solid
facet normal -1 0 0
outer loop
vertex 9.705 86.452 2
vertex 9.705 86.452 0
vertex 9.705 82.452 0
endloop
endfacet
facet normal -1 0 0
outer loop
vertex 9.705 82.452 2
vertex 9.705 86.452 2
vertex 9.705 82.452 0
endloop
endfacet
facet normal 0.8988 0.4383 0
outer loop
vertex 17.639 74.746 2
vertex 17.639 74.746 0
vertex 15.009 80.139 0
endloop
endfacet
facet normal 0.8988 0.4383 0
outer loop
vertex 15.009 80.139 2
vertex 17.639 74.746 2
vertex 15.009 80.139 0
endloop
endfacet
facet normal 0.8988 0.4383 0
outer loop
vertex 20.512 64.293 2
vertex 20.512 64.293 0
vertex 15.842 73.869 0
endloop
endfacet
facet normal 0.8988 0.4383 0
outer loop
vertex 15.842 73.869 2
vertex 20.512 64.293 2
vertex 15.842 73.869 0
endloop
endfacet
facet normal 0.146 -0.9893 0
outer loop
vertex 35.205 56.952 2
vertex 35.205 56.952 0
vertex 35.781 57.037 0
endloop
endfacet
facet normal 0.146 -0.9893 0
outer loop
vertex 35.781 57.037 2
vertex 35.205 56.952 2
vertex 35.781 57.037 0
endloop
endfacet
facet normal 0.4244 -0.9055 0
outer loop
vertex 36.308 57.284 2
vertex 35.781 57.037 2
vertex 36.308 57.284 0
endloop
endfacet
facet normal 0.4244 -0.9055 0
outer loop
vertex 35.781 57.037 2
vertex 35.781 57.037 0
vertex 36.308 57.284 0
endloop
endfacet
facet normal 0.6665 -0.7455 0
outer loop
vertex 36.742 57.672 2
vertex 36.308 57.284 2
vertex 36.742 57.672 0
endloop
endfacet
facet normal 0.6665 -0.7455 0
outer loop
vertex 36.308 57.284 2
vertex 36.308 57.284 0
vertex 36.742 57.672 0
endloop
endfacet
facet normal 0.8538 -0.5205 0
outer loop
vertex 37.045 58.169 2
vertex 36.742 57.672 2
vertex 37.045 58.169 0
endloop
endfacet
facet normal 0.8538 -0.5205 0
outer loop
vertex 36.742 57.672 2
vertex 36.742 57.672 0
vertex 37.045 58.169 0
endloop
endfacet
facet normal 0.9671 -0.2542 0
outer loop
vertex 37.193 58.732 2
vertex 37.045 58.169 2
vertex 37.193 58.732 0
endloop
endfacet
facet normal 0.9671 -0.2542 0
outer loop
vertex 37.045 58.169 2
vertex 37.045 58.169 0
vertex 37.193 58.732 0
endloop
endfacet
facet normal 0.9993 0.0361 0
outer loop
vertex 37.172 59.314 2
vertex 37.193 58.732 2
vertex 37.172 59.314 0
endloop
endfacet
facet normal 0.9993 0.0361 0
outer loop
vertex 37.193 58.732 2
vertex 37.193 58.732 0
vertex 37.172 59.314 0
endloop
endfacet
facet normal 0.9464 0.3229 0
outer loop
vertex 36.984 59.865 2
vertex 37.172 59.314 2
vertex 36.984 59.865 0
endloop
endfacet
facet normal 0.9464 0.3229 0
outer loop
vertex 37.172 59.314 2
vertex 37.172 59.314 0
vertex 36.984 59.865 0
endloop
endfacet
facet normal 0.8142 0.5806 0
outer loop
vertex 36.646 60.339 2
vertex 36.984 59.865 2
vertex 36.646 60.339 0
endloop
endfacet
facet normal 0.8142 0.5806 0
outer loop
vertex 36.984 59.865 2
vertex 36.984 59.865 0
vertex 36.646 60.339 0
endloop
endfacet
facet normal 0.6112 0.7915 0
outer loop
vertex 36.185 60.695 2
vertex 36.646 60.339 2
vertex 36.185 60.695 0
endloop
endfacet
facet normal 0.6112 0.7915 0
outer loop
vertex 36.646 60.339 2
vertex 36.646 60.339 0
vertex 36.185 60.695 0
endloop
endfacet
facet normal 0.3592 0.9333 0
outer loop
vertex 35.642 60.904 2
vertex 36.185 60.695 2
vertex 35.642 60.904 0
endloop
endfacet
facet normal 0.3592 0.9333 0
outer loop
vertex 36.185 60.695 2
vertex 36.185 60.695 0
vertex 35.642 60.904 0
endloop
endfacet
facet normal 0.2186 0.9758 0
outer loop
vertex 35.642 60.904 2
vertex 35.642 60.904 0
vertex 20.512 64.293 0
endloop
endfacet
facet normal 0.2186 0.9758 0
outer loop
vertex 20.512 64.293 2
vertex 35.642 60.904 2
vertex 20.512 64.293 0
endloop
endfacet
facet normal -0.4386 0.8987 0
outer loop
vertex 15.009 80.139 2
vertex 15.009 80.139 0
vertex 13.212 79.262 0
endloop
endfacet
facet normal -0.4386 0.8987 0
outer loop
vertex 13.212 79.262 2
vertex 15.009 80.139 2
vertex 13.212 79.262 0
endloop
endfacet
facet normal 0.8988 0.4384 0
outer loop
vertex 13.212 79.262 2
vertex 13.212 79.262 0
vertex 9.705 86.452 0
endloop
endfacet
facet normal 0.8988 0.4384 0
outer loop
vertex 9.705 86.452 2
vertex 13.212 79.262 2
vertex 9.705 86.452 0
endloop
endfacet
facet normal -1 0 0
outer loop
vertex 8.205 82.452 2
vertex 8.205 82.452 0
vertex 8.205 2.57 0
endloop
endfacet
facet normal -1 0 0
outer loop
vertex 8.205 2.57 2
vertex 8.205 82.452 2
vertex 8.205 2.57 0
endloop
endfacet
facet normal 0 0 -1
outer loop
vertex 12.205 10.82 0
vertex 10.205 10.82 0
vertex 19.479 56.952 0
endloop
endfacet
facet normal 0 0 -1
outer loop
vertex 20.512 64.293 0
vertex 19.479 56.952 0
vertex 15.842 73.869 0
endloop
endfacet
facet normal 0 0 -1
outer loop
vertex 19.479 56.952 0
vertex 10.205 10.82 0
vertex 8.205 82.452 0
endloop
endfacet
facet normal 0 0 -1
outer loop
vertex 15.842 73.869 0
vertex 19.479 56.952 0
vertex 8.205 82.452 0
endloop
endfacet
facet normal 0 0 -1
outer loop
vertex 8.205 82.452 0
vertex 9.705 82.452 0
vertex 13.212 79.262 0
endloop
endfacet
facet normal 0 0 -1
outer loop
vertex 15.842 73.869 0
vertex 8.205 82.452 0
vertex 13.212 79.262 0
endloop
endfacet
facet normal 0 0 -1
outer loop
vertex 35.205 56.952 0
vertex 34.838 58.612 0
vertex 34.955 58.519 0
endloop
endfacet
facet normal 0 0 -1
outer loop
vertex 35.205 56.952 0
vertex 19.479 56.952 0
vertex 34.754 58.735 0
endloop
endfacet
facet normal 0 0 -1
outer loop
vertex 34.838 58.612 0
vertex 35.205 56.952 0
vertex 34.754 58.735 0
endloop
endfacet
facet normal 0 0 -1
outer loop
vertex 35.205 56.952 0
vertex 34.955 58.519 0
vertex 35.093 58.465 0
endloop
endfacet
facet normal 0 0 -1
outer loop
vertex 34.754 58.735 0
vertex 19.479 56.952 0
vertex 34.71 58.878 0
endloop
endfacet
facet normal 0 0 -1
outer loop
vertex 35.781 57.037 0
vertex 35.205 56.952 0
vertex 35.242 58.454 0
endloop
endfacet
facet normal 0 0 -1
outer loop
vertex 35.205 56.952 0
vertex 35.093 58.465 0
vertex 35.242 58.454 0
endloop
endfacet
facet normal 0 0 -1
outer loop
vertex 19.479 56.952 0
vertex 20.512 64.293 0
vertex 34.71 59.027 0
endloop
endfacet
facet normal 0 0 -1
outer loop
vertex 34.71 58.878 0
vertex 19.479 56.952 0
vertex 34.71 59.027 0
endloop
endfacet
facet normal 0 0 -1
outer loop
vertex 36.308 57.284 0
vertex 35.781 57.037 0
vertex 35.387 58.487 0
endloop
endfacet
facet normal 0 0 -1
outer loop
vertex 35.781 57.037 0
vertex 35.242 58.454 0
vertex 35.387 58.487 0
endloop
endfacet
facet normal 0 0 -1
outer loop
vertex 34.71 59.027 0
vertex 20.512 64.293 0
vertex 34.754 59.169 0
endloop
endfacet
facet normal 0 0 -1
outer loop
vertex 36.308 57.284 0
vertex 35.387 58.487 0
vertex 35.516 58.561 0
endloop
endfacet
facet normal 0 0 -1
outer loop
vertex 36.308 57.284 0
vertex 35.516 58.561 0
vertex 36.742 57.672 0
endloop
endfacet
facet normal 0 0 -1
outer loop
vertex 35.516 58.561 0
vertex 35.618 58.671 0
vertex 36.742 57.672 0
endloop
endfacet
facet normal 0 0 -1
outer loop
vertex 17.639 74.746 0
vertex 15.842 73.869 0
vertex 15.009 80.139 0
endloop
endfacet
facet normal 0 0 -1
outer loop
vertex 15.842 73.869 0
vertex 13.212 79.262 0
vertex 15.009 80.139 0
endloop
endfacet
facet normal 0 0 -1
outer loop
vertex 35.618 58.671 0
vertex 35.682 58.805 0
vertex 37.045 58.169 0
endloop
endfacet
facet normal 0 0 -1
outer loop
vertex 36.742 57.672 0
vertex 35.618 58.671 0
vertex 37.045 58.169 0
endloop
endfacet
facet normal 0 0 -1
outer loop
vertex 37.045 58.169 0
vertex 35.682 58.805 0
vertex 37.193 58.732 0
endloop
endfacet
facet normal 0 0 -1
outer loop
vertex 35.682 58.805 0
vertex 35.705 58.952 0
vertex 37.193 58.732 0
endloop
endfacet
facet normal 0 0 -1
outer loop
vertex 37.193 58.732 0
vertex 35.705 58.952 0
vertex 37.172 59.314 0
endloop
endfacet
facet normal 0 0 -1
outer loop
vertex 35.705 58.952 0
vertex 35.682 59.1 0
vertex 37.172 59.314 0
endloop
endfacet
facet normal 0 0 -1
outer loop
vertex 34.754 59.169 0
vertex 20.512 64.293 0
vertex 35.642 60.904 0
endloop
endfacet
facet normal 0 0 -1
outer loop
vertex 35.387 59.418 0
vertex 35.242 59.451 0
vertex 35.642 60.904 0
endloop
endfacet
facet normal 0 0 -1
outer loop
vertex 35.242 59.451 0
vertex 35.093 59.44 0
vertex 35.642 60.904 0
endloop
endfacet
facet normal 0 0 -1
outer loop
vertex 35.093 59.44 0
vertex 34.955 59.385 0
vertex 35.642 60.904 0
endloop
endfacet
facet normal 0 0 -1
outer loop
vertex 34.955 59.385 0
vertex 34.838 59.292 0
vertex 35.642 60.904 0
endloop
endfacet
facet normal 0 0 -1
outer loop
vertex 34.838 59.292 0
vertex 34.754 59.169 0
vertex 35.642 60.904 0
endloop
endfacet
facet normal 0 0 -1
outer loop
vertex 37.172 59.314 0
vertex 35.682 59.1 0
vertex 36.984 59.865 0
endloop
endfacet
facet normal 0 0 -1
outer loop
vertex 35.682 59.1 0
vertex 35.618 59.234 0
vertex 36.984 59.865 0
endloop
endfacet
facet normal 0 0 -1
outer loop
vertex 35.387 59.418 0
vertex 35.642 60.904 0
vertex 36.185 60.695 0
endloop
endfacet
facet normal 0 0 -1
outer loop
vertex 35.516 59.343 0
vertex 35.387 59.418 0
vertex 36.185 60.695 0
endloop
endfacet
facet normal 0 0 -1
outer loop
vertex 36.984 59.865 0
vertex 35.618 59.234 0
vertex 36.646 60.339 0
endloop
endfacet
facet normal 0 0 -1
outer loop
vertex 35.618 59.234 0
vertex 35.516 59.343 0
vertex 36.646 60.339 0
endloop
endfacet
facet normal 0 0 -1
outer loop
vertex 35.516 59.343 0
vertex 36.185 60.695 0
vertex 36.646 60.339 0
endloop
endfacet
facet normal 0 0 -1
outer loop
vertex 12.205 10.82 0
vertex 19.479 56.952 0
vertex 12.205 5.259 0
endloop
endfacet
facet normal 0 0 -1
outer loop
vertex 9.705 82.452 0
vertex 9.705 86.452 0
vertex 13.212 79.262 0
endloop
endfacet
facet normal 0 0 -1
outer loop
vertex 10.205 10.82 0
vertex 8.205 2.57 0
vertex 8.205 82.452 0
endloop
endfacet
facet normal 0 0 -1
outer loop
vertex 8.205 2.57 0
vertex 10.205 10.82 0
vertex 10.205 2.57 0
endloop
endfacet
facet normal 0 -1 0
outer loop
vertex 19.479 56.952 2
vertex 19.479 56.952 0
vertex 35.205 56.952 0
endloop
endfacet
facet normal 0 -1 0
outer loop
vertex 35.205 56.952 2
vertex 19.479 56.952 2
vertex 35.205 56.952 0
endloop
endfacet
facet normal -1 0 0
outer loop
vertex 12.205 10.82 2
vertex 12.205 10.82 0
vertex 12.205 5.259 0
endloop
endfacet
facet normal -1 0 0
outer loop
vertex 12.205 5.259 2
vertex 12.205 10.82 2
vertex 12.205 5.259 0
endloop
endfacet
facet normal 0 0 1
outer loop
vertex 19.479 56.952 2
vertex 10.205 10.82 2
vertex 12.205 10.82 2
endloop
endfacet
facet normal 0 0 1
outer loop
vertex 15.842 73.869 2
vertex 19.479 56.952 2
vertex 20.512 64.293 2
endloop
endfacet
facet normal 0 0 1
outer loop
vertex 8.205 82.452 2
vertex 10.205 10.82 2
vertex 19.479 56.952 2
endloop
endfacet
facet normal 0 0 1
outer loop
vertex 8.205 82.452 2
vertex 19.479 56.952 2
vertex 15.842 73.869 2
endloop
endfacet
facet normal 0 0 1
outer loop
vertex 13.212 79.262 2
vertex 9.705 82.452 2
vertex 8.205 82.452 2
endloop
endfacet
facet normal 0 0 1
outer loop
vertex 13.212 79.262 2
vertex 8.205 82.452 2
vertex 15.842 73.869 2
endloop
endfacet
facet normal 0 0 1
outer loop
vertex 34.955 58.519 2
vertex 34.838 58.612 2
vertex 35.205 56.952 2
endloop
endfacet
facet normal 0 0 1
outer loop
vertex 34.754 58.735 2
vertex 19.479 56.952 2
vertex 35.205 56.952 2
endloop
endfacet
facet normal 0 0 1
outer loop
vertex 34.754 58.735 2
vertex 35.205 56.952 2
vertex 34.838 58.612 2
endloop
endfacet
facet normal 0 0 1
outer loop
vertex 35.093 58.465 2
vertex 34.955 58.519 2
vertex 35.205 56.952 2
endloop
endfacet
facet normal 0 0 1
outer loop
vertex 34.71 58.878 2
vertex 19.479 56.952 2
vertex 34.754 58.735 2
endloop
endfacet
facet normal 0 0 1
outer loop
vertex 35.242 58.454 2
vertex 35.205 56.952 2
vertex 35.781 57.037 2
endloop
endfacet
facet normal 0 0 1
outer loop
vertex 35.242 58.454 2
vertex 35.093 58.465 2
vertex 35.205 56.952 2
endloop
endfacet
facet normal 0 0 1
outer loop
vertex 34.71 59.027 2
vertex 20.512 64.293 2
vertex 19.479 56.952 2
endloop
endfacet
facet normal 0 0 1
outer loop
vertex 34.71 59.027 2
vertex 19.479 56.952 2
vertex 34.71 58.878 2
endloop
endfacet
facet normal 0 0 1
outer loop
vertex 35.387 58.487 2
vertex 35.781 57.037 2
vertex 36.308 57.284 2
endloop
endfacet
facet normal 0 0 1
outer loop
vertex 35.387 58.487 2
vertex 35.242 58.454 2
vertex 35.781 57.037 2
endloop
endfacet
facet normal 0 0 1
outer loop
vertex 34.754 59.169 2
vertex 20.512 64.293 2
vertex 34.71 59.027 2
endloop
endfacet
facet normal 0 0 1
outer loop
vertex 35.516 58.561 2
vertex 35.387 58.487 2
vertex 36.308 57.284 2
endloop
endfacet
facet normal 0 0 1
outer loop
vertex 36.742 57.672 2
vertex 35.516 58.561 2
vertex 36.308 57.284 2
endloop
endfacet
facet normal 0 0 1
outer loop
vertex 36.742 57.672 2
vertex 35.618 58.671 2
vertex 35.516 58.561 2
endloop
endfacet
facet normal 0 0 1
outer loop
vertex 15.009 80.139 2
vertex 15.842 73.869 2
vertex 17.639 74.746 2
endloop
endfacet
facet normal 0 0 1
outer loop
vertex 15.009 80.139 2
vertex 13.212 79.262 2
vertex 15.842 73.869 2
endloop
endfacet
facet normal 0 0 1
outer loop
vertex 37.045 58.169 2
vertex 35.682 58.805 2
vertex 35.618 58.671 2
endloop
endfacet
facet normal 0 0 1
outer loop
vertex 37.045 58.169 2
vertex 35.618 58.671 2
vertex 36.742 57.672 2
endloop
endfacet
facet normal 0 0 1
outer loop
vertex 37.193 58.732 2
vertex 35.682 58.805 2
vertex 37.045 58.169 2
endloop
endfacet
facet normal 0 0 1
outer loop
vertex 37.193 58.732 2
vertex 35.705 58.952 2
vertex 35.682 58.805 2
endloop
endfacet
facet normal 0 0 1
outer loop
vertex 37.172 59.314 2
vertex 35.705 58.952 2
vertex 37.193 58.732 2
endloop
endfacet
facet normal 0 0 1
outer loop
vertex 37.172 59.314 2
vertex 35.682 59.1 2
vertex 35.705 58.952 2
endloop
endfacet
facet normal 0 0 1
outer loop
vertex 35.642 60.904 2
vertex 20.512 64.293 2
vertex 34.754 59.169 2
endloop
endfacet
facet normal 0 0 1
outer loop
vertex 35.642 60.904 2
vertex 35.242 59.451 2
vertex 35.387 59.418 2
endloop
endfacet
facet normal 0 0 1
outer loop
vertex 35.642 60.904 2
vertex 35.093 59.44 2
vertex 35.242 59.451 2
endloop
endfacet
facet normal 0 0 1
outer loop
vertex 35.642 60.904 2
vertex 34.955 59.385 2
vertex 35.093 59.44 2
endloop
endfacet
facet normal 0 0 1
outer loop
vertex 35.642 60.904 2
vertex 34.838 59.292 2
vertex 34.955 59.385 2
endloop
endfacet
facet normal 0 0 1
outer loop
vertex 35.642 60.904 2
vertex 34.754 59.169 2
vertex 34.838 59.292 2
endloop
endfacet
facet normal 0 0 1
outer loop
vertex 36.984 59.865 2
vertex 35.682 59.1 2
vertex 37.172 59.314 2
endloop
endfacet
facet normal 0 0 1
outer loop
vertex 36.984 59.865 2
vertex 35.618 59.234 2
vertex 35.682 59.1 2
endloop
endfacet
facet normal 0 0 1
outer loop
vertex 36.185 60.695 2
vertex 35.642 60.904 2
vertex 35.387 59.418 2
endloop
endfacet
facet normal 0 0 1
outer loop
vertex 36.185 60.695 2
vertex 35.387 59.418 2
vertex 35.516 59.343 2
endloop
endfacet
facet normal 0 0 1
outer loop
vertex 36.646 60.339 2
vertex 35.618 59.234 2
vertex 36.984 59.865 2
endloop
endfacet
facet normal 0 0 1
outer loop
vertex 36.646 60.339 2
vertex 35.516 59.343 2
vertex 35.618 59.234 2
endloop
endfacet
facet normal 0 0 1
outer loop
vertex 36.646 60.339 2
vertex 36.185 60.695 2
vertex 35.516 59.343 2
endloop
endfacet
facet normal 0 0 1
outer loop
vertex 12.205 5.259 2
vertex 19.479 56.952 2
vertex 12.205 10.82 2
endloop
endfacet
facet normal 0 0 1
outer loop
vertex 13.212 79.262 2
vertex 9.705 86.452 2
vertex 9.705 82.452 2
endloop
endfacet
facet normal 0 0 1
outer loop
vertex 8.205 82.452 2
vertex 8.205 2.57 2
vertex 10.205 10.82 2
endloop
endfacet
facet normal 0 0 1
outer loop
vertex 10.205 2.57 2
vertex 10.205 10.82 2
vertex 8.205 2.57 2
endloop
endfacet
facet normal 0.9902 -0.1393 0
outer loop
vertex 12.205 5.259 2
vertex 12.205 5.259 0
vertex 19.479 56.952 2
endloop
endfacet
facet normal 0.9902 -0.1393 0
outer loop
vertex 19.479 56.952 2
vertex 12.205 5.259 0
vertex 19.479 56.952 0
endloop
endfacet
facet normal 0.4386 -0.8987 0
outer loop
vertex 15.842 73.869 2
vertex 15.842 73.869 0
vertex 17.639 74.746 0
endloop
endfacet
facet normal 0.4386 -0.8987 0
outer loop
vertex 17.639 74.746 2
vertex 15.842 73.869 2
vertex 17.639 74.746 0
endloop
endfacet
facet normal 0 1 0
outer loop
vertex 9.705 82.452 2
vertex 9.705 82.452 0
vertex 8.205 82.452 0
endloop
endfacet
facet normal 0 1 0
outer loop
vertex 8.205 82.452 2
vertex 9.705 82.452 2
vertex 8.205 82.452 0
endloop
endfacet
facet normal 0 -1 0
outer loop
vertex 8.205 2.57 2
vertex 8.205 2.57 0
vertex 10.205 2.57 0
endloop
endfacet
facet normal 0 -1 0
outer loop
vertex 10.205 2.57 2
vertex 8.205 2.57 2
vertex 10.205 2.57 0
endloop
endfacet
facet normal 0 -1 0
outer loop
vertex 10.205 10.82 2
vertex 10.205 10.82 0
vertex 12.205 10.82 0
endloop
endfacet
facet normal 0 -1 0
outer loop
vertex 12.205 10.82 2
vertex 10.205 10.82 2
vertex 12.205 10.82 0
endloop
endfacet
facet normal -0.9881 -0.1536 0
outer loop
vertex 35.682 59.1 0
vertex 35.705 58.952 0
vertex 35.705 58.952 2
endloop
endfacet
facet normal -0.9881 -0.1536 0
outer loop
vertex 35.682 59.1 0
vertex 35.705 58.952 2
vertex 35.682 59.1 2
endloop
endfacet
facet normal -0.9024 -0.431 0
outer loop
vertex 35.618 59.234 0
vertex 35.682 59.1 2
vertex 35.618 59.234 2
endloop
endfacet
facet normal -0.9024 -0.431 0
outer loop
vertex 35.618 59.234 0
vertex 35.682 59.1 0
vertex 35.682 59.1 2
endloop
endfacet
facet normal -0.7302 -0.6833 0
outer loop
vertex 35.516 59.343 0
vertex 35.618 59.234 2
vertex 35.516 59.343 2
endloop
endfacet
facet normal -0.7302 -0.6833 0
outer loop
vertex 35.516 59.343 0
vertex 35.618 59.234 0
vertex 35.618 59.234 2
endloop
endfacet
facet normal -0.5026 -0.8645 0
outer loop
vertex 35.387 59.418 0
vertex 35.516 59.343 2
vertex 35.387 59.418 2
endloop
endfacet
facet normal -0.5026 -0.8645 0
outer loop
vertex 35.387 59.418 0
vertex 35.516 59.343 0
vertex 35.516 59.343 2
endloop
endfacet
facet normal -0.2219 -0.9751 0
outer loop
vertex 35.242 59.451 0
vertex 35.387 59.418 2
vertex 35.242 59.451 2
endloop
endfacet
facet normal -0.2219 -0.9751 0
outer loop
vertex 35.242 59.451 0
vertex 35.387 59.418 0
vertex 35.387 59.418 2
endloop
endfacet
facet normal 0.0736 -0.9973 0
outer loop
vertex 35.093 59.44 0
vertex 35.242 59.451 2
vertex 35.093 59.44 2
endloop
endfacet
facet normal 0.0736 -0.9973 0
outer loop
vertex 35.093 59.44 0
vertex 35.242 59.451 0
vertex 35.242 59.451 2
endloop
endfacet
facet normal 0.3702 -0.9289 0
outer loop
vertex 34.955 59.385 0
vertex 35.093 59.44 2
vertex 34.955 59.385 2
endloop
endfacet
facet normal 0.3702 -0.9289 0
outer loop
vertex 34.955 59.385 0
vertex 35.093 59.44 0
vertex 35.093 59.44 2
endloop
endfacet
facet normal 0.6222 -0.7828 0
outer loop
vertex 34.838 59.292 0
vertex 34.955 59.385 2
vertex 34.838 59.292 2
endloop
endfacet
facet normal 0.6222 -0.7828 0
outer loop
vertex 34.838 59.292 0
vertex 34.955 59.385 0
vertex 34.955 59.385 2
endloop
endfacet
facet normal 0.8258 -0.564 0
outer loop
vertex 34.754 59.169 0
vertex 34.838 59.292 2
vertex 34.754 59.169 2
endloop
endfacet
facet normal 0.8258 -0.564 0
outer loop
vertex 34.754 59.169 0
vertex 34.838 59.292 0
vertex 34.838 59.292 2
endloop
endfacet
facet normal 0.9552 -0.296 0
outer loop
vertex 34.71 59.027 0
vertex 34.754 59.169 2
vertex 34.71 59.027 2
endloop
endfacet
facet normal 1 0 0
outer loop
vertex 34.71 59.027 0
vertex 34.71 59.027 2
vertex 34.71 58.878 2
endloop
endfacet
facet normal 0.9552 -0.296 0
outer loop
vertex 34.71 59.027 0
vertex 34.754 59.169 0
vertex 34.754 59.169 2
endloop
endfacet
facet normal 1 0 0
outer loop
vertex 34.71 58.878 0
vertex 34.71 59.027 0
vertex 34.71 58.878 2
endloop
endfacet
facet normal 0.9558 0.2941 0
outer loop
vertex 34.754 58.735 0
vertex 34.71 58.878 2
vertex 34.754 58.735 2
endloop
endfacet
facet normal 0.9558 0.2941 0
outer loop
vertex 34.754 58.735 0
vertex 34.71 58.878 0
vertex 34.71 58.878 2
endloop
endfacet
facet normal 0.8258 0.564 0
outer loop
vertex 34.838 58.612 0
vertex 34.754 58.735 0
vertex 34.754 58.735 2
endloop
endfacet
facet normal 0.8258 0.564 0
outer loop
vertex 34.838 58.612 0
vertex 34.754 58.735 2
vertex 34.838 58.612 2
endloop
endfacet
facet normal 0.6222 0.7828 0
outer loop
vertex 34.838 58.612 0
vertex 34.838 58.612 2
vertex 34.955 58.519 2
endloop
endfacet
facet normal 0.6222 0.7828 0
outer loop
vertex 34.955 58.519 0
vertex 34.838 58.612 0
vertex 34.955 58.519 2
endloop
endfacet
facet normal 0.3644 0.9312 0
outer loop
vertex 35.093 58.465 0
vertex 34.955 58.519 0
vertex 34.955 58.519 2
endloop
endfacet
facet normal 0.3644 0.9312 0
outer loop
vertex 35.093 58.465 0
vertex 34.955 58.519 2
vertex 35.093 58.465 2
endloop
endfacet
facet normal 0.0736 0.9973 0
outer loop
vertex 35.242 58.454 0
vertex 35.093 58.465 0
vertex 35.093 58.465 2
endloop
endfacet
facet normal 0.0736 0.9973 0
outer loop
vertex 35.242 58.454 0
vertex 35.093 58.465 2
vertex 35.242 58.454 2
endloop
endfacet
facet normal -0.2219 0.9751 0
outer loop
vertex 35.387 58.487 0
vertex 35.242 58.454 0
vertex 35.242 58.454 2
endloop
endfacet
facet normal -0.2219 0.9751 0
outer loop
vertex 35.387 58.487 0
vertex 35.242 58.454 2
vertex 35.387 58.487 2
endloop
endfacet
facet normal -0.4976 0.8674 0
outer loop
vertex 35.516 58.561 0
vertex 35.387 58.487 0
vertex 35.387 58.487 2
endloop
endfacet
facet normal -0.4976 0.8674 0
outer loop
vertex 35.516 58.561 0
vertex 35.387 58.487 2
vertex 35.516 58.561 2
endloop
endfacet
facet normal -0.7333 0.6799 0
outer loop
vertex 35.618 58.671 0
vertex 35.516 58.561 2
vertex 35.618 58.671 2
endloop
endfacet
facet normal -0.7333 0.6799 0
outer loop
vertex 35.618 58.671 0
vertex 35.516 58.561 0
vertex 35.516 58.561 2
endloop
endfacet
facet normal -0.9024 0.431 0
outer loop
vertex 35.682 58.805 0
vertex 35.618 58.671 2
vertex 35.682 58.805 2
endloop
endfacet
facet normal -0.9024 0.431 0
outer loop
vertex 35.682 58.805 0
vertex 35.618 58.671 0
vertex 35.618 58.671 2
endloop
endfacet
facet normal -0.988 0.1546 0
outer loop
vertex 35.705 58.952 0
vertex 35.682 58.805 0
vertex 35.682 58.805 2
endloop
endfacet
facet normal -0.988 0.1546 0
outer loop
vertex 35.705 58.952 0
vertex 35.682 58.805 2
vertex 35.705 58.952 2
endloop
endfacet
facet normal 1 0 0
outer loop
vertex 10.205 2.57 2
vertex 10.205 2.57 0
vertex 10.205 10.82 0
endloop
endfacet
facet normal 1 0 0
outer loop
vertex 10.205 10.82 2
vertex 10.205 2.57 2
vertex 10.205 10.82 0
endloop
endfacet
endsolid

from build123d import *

# Parameters (mm, degrees)
SKETCH_1_R      = 0.5
EXTRUDE_1_DEPTH = 2


with BuildPart() as part:
    # 草图1 → 凸台-拉伸1 (new body)
    with BuildSketch(Plane.XY):
        with BuildLine():
            Line((12.204680674, 10.819505304), (12.204680674, 5.259215029))
            Line((12.204680674, 5.259215029), (19.479224798, 56.952222064))
            Line((19.479224798, 56.952222064), (35.204680674, 56.952222064))
            ThreePointArc((35.204680674, 56.952222064), (37.192550066, 58.73227825), (35.64190025, 60.903846783))
            Line((35.64190025, 60.903846783), (20.512305514, 64.293307336))
            Line((20.512305514, 64.293307336), (15.841876729, 73.869105416))
            Line((15.841876729, 73.869105416), (17.639464822, 74.74584771))
            Line((17.639464822, 74.74584771), (15.009237941, 80.138611987))
            Line((15.009237941, 80.138611987), (13.211649848, 79.261869694))
            Line((13.211649848, 79.261869694), (9.704680674, 86.452222064))
            Line((9.704680674, 86.452222064), (9.704680674, 82.452222064))
            Line((9.704680674, 82.452222064), (8.204680674, 82.452222064))
            Line((8.204680674, 82.452222064), (8.204680674, 2.569505304))
            Line((8.204680674, 2.569505304), (10.204680674, 2.569505304))
            Line((10.204680674, 2.569505304), (10.204680674, 10.819505304))
            Line((10.204680674, 10.819505304), (12.204680674, 10.819505304))
        make_face()
        with Locations((35.204680674, 58.952222064)):
            Circle(SKETCH_1_R, mode=Mode.SUBTRACT)
    extrude(amount=EXTRUDE_1_DEPTH)


solid = part.part
